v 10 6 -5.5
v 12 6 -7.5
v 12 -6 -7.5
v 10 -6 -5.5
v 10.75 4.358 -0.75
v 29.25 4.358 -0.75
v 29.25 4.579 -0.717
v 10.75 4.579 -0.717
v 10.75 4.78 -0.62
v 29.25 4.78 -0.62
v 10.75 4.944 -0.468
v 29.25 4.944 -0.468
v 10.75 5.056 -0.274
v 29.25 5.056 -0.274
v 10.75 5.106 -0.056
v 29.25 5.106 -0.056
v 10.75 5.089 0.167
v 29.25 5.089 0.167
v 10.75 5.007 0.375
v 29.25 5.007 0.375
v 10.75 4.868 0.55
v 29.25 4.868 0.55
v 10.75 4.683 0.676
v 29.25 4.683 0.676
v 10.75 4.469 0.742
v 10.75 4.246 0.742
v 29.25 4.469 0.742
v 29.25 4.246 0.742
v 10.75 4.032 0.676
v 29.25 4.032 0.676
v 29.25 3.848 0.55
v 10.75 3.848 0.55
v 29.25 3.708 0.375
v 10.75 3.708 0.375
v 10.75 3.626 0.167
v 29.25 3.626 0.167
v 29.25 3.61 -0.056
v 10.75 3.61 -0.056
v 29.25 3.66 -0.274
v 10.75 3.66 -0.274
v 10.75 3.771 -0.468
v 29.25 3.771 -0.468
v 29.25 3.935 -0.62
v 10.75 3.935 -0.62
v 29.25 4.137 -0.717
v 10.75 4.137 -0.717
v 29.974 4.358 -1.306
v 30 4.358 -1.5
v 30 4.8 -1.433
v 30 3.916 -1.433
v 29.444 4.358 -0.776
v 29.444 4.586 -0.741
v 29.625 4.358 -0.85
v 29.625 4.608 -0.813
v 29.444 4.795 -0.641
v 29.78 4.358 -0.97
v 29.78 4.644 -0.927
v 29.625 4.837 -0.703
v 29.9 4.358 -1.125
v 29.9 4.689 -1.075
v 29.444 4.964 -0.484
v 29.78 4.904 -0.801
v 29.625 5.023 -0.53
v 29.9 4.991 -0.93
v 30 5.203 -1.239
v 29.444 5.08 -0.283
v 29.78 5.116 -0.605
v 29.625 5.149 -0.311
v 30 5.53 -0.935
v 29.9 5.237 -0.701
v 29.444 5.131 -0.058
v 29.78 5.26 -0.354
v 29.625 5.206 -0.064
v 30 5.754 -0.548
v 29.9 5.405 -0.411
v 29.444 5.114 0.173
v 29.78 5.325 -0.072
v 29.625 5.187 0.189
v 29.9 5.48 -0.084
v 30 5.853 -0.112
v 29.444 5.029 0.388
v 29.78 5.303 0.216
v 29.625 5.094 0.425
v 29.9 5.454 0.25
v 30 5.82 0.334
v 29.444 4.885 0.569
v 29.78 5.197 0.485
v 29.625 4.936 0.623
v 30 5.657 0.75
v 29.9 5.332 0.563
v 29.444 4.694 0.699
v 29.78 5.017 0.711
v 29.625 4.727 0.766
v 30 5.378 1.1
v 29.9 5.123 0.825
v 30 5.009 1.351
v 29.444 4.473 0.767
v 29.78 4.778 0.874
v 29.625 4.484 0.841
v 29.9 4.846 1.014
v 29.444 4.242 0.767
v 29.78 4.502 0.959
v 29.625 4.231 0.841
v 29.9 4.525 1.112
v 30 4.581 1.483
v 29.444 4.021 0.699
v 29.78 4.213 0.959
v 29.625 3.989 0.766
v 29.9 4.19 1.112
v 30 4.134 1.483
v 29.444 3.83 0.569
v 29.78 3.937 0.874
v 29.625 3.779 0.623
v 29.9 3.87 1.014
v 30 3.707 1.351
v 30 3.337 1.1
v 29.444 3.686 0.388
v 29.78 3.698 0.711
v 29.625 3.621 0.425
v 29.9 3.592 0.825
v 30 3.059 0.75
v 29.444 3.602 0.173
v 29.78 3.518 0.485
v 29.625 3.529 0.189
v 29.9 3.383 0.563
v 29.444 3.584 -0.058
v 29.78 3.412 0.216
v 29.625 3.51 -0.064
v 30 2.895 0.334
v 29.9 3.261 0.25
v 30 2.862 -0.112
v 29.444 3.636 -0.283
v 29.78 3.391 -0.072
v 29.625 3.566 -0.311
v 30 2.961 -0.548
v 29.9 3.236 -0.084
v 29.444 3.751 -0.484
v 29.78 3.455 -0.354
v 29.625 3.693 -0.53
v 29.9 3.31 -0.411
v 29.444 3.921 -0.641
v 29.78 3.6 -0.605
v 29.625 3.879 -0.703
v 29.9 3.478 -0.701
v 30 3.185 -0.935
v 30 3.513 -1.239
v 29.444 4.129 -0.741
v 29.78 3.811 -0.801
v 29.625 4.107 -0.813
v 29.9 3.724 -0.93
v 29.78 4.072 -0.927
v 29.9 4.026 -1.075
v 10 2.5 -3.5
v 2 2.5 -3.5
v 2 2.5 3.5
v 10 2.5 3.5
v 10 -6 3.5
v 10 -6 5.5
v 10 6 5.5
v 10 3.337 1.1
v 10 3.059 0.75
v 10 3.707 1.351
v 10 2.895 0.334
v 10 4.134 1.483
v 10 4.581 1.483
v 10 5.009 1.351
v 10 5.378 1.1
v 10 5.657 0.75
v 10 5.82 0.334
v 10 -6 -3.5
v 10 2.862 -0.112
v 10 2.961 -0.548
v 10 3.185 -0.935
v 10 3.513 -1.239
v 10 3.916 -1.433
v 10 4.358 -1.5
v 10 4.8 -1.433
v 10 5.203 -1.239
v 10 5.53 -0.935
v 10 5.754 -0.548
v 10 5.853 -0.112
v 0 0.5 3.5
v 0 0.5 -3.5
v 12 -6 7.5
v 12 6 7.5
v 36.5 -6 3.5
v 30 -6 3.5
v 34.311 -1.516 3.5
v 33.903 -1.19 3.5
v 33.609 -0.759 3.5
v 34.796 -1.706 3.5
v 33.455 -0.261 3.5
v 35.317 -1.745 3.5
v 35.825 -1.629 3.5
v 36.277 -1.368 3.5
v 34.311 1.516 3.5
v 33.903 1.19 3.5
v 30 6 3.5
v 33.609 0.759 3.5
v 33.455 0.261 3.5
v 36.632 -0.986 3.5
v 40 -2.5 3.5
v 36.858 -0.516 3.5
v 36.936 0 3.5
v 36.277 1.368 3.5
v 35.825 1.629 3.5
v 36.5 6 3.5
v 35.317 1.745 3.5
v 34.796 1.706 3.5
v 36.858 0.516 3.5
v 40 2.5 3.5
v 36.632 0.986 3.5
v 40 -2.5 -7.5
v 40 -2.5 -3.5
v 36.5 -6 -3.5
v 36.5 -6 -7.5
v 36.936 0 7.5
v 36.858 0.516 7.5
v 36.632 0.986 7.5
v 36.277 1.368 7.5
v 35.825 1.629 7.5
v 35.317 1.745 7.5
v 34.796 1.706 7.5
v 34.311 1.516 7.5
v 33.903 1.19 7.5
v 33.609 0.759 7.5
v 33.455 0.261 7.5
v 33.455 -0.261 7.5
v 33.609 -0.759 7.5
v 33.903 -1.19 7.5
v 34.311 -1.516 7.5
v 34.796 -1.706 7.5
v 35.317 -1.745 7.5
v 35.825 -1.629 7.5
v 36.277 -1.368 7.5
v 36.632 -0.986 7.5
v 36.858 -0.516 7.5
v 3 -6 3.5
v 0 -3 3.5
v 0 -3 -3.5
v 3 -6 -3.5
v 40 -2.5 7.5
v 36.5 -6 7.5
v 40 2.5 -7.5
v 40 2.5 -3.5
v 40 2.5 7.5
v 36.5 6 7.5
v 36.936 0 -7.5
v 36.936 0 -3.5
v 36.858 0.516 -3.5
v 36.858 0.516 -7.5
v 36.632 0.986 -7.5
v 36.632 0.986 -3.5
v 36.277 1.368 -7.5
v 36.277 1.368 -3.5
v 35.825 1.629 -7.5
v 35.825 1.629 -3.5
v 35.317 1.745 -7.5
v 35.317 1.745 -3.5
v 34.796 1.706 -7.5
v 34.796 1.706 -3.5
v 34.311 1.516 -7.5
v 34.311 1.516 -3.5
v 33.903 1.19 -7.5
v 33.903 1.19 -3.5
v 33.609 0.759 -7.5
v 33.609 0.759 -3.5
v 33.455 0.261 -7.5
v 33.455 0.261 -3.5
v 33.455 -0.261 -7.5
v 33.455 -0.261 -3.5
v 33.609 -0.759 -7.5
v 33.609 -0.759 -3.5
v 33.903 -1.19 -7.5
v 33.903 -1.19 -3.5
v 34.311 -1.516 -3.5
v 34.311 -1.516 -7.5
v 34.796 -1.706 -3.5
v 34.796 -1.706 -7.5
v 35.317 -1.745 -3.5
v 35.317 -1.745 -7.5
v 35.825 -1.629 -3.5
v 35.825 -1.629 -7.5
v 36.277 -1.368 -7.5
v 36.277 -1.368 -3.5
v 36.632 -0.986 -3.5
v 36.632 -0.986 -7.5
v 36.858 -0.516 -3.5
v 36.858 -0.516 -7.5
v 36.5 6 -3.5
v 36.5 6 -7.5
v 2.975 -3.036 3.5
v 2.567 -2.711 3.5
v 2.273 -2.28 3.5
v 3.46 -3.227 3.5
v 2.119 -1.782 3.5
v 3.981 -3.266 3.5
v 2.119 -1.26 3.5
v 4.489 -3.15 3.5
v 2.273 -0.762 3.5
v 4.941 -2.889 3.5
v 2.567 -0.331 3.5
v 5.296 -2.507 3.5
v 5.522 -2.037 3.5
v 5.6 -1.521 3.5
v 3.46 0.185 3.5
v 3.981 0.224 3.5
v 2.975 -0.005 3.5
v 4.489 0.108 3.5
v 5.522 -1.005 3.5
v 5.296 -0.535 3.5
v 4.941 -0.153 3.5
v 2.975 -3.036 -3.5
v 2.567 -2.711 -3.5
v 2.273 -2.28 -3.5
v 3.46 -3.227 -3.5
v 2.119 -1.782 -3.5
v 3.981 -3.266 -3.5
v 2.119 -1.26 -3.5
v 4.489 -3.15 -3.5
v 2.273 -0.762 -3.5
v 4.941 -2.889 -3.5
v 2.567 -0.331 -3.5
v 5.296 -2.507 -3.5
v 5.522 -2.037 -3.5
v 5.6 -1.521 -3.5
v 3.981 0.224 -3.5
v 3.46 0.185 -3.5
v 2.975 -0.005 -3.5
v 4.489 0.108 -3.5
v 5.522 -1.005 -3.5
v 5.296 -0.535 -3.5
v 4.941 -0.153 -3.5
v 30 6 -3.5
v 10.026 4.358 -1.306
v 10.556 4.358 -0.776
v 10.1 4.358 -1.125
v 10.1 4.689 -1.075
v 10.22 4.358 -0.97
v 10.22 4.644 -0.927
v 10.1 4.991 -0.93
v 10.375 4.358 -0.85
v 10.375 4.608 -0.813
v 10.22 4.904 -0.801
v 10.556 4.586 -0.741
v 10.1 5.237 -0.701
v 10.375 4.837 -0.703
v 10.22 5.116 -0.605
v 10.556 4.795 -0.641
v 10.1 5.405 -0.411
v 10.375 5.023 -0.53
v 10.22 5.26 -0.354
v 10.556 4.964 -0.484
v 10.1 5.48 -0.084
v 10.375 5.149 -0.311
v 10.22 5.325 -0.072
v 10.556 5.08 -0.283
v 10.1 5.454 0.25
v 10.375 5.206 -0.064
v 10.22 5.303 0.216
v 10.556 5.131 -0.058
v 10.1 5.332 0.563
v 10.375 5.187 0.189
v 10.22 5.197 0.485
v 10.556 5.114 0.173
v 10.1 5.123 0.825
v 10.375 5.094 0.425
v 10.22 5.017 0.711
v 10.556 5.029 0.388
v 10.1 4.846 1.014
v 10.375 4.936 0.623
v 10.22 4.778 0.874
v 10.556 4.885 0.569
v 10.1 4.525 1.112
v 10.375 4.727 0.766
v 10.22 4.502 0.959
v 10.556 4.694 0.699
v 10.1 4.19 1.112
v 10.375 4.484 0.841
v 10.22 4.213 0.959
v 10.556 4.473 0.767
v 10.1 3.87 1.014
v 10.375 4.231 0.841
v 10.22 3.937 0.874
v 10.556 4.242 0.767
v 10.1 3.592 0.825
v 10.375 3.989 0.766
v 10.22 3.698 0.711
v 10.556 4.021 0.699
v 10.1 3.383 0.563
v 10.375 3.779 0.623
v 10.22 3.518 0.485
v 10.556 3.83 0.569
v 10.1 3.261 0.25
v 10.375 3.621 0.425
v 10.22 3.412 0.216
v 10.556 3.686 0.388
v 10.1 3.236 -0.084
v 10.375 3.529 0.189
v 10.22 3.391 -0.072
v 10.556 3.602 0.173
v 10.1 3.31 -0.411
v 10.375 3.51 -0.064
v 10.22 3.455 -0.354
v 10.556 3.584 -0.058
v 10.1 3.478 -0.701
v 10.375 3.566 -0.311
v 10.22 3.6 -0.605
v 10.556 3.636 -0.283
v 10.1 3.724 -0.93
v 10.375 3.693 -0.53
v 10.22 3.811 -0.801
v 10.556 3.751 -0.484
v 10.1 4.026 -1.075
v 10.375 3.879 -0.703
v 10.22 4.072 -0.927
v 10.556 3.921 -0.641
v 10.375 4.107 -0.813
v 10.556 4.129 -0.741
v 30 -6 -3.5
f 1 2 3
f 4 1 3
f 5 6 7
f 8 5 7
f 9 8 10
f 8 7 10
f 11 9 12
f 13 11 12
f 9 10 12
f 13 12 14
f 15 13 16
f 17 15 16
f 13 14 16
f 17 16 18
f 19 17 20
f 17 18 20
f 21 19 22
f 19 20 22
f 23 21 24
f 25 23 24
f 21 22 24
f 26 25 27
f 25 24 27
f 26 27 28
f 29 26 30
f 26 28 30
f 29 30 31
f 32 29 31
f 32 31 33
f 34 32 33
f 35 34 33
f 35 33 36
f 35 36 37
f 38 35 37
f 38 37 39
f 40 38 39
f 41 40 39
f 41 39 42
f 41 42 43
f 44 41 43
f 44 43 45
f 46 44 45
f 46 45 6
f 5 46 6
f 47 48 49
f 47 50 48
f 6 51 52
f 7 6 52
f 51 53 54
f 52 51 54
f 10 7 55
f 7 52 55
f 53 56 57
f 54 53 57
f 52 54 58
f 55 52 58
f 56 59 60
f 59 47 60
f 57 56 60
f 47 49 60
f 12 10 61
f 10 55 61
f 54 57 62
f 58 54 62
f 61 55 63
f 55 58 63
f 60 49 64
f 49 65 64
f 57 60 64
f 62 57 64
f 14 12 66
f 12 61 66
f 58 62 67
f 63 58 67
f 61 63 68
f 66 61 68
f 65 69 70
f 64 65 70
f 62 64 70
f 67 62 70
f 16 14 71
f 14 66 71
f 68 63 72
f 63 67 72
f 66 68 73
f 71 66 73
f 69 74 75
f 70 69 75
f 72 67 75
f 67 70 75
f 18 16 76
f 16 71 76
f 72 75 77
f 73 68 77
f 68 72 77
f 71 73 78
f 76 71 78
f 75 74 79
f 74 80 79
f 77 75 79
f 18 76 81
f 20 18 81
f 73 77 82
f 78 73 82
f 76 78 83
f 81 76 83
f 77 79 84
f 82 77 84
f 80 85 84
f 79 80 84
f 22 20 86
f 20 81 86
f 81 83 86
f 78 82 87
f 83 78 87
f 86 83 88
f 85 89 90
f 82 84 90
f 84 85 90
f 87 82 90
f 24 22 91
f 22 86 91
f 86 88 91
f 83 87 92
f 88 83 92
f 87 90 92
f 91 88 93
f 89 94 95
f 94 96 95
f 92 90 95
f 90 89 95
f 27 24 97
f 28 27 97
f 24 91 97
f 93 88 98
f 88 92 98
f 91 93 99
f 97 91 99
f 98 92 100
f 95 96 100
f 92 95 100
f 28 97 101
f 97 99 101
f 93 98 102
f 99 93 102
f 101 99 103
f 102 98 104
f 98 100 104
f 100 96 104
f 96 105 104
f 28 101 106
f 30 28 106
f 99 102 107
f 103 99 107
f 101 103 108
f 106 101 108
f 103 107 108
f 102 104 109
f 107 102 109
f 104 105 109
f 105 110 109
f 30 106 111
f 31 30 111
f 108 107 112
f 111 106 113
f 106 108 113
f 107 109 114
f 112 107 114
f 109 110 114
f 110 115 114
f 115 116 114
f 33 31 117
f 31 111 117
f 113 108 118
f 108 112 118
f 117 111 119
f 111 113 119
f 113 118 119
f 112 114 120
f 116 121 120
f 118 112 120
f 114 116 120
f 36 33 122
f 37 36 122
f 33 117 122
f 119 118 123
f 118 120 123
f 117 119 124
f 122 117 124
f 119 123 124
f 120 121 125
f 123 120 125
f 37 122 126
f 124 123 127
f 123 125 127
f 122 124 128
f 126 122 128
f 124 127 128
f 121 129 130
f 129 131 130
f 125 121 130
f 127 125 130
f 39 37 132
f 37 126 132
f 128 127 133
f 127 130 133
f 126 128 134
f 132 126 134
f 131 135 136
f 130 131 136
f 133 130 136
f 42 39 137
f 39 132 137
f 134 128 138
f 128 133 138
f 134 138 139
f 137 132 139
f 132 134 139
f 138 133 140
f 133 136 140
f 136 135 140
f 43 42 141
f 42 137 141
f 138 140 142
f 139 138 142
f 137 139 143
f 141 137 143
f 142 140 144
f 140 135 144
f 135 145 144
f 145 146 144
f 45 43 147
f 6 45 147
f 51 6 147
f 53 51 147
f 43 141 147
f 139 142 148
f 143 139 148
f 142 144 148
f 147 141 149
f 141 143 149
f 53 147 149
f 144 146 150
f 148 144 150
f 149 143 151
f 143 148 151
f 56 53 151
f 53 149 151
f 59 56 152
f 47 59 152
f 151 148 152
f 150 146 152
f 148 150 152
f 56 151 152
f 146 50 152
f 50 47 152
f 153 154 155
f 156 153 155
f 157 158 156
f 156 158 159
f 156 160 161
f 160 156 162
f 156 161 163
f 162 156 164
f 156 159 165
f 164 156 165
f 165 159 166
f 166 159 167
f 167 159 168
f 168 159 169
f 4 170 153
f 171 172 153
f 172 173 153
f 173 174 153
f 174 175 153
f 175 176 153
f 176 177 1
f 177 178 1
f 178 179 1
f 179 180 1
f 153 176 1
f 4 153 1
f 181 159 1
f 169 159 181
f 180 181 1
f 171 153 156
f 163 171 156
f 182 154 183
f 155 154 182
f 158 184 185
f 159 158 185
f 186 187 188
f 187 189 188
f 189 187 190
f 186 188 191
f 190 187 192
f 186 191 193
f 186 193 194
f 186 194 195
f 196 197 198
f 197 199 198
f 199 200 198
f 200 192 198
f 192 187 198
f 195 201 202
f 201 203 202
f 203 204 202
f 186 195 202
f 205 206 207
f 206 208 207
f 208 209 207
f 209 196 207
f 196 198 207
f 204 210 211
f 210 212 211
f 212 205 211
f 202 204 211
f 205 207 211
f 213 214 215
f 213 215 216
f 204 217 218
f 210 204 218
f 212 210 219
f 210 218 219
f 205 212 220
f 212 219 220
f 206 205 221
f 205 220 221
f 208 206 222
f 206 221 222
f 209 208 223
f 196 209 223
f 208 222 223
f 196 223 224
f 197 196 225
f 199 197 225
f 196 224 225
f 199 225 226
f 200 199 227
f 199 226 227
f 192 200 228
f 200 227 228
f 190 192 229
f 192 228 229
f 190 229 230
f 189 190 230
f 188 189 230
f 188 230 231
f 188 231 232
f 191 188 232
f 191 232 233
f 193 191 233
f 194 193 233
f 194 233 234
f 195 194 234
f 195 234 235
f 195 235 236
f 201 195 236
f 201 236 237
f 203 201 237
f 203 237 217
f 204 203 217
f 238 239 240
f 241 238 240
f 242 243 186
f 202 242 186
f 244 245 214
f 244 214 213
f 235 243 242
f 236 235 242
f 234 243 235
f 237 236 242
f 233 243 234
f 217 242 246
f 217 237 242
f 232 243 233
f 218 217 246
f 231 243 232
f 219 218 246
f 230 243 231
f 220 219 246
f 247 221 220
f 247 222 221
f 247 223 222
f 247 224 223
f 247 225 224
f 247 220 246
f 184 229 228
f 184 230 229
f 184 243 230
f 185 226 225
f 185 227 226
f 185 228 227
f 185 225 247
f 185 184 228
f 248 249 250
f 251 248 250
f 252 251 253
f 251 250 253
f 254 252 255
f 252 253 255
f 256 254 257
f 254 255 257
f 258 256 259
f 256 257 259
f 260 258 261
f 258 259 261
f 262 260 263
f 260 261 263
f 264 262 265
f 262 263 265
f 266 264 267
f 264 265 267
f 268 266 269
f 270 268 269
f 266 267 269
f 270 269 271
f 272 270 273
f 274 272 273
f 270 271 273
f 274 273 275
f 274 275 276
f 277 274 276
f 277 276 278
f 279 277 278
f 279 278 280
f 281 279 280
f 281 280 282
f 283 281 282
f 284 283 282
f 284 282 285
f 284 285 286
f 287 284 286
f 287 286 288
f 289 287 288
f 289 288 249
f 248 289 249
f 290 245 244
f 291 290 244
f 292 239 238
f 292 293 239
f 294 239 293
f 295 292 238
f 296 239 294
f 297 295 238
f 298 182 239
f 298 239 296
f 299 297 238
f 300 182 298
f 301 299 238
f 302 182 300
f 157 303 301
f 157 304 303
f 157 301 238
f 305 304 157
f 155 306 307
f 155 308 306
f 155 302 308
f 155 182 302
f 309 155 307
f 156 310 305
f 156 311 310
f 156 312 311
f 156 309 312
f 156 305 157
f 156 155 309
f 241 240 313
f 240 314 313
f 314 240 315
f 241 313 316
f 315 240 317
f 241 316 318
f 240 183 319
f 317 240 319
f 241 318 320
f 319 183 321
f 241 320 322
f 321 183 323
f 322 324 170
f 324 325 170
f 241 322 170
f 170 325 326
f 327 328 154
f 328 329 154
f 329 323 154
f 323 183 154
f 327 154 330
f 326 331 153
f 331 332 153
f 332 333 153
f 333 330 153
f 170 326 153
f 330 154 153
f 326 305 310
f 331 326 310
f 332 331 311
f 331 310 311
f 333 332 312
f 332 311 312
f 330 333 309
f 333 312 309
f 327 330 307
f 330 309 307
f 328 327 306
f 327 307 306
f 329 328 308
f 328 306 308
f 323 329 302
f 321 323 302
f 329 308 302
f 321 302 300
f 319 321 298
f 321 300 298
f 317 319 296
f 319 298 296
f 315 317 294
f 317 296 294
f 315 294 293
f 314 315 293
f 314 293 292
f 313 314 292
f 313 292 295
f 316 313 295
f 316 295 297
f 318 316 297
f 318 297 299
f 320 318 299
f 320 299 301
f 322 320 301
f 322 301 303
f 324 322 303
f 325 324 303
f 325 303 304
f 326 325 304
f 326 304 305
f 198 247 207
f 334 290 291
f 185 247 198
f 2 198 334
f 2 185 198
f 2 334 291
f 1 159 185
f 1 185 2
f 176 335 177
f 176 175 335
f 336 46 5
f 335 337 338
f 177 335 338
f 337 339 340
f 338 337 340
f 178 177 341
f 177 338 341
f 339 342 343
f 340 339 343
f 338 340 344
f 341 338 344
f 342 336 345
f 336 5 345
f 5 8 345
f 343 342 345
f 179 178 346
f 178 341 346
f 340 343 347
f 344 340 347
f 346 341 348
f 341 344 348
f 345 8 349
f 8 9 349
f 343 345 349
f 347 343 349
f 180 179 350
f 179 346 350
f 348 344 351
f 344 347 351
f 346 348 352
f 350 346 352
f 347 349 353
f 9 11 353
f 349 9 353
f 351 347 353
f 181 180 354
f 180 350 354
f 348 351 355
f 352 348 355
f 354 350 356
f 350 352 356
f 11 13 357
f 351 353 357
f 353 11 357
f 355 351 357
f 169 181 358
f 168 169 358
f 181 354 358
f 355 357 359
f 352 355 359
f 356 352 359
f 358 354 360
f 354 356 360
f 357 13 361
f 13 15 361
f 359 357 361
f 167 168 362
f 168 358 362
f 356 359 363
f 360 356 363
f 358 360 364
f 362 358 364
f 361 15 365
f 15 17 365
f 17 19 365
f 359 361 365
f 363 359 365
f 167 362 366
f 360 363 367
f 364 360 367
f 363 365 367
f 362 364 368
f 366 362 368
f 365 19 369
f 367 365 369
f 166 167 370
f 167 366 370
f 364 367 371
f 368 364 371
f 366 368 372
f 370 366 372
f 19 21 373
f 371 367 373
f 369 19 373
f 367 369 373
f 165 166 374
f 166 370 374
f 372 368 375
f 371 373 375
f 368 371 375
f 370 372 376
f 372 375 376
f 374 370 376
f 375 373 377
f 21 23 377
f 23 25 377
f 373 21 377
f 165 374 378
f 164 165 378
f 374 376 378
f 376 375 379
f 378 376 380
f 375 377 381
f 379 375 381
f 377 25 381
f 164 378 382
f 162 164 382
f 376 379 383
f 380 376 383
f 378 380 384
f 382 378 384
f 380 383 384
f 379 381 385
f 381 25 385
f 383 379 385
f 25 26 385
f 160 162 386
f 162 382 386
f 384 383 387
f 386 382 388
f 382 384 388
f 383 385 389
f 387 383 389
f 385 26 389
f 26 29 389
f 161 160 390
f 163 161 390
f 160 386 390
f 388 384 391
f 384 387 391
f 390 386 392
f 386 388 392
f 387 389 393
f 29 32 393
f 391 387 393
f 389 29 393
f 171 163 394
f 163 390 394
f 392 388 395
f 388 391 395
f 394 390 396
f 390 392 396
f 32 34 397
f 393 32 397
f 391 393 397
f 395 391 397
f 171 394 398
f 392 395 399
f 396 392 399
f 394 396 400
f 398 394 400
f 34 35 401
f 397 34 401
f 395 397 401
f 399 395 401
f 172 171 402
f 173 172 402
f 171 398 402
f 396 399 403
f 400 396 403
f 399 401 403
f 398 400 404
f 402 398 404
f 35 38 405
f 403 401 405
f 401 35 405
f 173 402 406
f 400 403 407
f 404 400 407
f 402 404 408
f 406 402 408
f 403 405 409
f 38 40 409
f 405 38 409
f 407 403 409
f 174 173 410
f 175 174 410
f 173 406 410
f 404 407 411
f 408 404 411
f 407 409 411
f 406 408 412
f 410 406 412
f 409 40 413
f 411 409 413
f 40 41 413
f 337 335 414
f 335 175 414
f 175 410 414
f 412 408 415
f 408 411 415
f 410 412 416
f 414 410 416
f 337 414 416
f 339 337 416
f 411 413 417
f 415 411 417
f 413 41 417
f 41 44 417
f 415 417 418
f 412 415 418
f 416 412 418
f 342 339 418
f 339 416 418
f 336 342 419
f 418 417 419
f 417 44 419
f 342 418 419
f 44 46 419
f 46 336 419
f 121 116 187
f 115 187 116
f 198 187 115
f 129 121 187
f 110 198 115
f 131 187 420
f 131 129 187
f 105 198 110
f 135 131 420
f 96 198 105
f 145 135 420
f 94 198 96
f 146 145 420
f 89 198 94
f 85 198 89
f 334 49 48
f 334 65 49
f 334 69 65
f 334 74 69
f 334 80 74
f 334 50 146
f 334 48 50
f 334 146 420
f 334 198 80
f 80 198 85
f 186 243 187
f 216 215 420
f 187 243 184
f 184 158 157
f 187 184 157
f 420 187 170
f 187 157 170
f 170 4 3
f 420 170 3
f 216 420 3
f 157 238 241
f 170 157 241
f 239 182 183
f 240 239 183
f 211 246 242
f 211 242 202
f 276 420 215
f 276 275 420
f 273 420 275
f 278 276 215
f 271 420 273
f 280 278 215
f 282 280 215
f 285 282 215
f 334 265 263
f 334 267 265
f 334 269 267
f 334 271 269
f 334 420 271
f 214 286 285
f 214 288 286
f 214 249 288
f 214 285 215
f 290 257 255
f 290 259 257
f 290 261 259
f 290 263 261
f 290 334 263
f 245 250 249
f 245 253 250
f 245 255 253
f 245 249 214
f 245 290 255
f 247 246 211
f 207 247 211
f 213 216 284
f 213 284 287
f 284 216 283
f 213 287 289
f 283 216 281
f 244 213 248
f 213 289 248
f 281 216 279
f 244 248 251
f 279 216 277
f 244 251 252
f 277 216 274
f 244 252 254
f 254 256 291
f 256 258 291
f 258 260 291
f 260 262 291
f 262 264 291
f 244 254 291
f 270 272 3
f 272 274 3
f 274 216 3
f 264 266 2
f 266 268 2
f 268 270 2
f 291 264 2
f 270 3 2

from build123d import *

# Parameters (mm, degrees)
SKETCH_2_W            = 15
SKETCH_2_H            = 12
EXTRUDE_1_DEPTH       = 40
SKETCH_3_W            = 13.345049732
SKETCH_3_H            = 6.461251269
CUT_EXTRUDE_1_DEPTH   = 43.429353047
SKETCH_4_R            = 1.75
CUT_EXTRUDE_2_DEPTH   = 42.91658383
SKETCH_5_W            = 15.367688112
SKETCH_5_H            = 7
CUT_EXTRUDE_2_2_DEPTH = 43.429353047
CHAMFER_4_SIZE        = 3.5
SKETCH_7_R            = 0.75
CUT_EXTRUDE_3_DEPTH   = 32.5
CHAMFER_5_SIZE        = 3
SKETCH_8_W            = 20.918678204
SKETCH_8_H            = 3.864211738
CUT_EXTRUDE_4_DEPTH   = 10
CHAMFER_6_SIZE        = 2
SKETCH_9_R            = 1.75
CUT_EXTRUDE_5_DEPTH   = 44.13930922
FILLET_6_R            = 0.75
CHAMFER_7_SIZE        = 2


with BuildPart() as part:
    # Эскиз2 → Вытянуть1 (new body)
    with BuildSketch(Plane(origin=(0, 0, 0), x_dir=(0, 0, -1), z_dir=(1, 0, 0))):
        Rectangle(SKETCH_2_W, SKETCH_2_H)
    extrude(amount=EXTRUDE_1_DEPTH)

    # Эскиз3 → Вырез-Вытянуть1 (cut, through all)
    with BuildSketch(Plane(origin=(0, 6, 0), x_dir=(1, 0, 0), z_dir=(0, 1, 0))):
        with Locations((3.327475134, -6.730625634)):
            Rectangle(SKETCH_3_W, SKETCH_3_H)
        with Locations((3.327475134, 6.730625634)):
            Rectangle(SKETCH_3_W, SKETCH_3_H)
    extrude(amount=-CUT_EXTRUDE_1_DEPTH, mode=Mode.SUBTRACT)

    # Эскиз4 → Cut-Extrude 2 (cut, through all)
    with BuildSketch(Plane.XY.offset(3.5)):
        with Locations((3.849904433, -1.520907782)):
            Circle(SKETCH_4_R)
    extrude(amount=-CUT_EXTRUDE_2_DEPTH, mode=Mode.SUBTRACT)

    # Эскиз5 → Cut-Extrude 2 2 (cut, through all)
    with BuildSketch(Plane(origin=(0, 6, 0), x_dir=(1, 0, 0), z_dir=(0, 1, 0))):
        with Locations((37.683844056, 0)):
            Rectangle(SKETCH_5_W, SKETCH_5_H)
    extrude(amount=-CUT_EXTRUDE_2_2_DEPTH, mode=Mode.SUBTRACT)

    # Фаска4
    chamfer_4_edges = [part.edges().sort_by_distance(p)[0] for p in [
        (40, -6, 5.5),
        (40, 6, 5.5),
        (40, -6, -5.5),
        (40, 6, -5.5),
    ]]
    chamfer(chamfer_4_edges, length=CHAMFER_4_SIZE)

    # Эскиз7 → Вытянуть3 (cut, through all)
    with BuildSketch(Plane(origin=(30, 0, 0), x_dir=(0, 0, -1), z_dir=(1, 0, 0))):
        with Locations((0, 4.357693323)):
            Circle(SKETCH_7_R)
    extrude(amount=-CUT_EXTRUDE_3_DEPTH, mode=Mode.SUBTRACT)

    # Фаска5
    chamfer_5_edges = [part.edges().sort_by_distance(p)[0] for p in [
        (0, -6, 0),
    ]]
    chamfer(chamfer_5_edges, length=CHAMFER_5_SIZE)

    # Эскиз8 → Вытянуть4 (cut)
    with BuildSketch(Plane.ZY):
        with Locations((-0.939401822, 4.432105869)):
            Rectangle(SKETCH_8_W, SKETCH_8_H)
    extrude(amount=-CUT_EXTRUDE_4_DEPTH, mode=Mode.SUBTRACT)

    # Фаска6
    chamfer_6_edges = [part.edges().sort_by_distance(p)[0] for p in [
        (0, 2.5, 0),
    ]]
    chamfer(chamfer_6_edges, length=CHAMFER_6_SIZE)

    # Эскиз9 → Вытянуть5 (cut, through all)
    with BuildSketch(Plane.XY.offset(7.5)):
        with Locations((35.185724632, 0)):
            Circle(SKETCH_9_R)
    extrude(amount=-CUT_EXTRUDE_5_DEPTH, mode=Mode.SUBTRACT)

    # Скругление6
    fillet_6_edges = [part.edges().sort_by_distance(p)[0] for p in [
        (30, 4.357693323, 0.75),
        (10, 4.357693323, 0.75),
    ]]
    fillet(fillet_6_edges, radius=FILLET_6_R)

    # Фаска7
    chamfer_7_edges = [part.edges().sort_by_distance(p)[0] for p in [
        (10, 0, -7.5),
        (10, 0, 7.5),
    ]]
    chamfer(chamfer_7_edges, length=CHAMFER_7_SIZE)


solid = part.part
